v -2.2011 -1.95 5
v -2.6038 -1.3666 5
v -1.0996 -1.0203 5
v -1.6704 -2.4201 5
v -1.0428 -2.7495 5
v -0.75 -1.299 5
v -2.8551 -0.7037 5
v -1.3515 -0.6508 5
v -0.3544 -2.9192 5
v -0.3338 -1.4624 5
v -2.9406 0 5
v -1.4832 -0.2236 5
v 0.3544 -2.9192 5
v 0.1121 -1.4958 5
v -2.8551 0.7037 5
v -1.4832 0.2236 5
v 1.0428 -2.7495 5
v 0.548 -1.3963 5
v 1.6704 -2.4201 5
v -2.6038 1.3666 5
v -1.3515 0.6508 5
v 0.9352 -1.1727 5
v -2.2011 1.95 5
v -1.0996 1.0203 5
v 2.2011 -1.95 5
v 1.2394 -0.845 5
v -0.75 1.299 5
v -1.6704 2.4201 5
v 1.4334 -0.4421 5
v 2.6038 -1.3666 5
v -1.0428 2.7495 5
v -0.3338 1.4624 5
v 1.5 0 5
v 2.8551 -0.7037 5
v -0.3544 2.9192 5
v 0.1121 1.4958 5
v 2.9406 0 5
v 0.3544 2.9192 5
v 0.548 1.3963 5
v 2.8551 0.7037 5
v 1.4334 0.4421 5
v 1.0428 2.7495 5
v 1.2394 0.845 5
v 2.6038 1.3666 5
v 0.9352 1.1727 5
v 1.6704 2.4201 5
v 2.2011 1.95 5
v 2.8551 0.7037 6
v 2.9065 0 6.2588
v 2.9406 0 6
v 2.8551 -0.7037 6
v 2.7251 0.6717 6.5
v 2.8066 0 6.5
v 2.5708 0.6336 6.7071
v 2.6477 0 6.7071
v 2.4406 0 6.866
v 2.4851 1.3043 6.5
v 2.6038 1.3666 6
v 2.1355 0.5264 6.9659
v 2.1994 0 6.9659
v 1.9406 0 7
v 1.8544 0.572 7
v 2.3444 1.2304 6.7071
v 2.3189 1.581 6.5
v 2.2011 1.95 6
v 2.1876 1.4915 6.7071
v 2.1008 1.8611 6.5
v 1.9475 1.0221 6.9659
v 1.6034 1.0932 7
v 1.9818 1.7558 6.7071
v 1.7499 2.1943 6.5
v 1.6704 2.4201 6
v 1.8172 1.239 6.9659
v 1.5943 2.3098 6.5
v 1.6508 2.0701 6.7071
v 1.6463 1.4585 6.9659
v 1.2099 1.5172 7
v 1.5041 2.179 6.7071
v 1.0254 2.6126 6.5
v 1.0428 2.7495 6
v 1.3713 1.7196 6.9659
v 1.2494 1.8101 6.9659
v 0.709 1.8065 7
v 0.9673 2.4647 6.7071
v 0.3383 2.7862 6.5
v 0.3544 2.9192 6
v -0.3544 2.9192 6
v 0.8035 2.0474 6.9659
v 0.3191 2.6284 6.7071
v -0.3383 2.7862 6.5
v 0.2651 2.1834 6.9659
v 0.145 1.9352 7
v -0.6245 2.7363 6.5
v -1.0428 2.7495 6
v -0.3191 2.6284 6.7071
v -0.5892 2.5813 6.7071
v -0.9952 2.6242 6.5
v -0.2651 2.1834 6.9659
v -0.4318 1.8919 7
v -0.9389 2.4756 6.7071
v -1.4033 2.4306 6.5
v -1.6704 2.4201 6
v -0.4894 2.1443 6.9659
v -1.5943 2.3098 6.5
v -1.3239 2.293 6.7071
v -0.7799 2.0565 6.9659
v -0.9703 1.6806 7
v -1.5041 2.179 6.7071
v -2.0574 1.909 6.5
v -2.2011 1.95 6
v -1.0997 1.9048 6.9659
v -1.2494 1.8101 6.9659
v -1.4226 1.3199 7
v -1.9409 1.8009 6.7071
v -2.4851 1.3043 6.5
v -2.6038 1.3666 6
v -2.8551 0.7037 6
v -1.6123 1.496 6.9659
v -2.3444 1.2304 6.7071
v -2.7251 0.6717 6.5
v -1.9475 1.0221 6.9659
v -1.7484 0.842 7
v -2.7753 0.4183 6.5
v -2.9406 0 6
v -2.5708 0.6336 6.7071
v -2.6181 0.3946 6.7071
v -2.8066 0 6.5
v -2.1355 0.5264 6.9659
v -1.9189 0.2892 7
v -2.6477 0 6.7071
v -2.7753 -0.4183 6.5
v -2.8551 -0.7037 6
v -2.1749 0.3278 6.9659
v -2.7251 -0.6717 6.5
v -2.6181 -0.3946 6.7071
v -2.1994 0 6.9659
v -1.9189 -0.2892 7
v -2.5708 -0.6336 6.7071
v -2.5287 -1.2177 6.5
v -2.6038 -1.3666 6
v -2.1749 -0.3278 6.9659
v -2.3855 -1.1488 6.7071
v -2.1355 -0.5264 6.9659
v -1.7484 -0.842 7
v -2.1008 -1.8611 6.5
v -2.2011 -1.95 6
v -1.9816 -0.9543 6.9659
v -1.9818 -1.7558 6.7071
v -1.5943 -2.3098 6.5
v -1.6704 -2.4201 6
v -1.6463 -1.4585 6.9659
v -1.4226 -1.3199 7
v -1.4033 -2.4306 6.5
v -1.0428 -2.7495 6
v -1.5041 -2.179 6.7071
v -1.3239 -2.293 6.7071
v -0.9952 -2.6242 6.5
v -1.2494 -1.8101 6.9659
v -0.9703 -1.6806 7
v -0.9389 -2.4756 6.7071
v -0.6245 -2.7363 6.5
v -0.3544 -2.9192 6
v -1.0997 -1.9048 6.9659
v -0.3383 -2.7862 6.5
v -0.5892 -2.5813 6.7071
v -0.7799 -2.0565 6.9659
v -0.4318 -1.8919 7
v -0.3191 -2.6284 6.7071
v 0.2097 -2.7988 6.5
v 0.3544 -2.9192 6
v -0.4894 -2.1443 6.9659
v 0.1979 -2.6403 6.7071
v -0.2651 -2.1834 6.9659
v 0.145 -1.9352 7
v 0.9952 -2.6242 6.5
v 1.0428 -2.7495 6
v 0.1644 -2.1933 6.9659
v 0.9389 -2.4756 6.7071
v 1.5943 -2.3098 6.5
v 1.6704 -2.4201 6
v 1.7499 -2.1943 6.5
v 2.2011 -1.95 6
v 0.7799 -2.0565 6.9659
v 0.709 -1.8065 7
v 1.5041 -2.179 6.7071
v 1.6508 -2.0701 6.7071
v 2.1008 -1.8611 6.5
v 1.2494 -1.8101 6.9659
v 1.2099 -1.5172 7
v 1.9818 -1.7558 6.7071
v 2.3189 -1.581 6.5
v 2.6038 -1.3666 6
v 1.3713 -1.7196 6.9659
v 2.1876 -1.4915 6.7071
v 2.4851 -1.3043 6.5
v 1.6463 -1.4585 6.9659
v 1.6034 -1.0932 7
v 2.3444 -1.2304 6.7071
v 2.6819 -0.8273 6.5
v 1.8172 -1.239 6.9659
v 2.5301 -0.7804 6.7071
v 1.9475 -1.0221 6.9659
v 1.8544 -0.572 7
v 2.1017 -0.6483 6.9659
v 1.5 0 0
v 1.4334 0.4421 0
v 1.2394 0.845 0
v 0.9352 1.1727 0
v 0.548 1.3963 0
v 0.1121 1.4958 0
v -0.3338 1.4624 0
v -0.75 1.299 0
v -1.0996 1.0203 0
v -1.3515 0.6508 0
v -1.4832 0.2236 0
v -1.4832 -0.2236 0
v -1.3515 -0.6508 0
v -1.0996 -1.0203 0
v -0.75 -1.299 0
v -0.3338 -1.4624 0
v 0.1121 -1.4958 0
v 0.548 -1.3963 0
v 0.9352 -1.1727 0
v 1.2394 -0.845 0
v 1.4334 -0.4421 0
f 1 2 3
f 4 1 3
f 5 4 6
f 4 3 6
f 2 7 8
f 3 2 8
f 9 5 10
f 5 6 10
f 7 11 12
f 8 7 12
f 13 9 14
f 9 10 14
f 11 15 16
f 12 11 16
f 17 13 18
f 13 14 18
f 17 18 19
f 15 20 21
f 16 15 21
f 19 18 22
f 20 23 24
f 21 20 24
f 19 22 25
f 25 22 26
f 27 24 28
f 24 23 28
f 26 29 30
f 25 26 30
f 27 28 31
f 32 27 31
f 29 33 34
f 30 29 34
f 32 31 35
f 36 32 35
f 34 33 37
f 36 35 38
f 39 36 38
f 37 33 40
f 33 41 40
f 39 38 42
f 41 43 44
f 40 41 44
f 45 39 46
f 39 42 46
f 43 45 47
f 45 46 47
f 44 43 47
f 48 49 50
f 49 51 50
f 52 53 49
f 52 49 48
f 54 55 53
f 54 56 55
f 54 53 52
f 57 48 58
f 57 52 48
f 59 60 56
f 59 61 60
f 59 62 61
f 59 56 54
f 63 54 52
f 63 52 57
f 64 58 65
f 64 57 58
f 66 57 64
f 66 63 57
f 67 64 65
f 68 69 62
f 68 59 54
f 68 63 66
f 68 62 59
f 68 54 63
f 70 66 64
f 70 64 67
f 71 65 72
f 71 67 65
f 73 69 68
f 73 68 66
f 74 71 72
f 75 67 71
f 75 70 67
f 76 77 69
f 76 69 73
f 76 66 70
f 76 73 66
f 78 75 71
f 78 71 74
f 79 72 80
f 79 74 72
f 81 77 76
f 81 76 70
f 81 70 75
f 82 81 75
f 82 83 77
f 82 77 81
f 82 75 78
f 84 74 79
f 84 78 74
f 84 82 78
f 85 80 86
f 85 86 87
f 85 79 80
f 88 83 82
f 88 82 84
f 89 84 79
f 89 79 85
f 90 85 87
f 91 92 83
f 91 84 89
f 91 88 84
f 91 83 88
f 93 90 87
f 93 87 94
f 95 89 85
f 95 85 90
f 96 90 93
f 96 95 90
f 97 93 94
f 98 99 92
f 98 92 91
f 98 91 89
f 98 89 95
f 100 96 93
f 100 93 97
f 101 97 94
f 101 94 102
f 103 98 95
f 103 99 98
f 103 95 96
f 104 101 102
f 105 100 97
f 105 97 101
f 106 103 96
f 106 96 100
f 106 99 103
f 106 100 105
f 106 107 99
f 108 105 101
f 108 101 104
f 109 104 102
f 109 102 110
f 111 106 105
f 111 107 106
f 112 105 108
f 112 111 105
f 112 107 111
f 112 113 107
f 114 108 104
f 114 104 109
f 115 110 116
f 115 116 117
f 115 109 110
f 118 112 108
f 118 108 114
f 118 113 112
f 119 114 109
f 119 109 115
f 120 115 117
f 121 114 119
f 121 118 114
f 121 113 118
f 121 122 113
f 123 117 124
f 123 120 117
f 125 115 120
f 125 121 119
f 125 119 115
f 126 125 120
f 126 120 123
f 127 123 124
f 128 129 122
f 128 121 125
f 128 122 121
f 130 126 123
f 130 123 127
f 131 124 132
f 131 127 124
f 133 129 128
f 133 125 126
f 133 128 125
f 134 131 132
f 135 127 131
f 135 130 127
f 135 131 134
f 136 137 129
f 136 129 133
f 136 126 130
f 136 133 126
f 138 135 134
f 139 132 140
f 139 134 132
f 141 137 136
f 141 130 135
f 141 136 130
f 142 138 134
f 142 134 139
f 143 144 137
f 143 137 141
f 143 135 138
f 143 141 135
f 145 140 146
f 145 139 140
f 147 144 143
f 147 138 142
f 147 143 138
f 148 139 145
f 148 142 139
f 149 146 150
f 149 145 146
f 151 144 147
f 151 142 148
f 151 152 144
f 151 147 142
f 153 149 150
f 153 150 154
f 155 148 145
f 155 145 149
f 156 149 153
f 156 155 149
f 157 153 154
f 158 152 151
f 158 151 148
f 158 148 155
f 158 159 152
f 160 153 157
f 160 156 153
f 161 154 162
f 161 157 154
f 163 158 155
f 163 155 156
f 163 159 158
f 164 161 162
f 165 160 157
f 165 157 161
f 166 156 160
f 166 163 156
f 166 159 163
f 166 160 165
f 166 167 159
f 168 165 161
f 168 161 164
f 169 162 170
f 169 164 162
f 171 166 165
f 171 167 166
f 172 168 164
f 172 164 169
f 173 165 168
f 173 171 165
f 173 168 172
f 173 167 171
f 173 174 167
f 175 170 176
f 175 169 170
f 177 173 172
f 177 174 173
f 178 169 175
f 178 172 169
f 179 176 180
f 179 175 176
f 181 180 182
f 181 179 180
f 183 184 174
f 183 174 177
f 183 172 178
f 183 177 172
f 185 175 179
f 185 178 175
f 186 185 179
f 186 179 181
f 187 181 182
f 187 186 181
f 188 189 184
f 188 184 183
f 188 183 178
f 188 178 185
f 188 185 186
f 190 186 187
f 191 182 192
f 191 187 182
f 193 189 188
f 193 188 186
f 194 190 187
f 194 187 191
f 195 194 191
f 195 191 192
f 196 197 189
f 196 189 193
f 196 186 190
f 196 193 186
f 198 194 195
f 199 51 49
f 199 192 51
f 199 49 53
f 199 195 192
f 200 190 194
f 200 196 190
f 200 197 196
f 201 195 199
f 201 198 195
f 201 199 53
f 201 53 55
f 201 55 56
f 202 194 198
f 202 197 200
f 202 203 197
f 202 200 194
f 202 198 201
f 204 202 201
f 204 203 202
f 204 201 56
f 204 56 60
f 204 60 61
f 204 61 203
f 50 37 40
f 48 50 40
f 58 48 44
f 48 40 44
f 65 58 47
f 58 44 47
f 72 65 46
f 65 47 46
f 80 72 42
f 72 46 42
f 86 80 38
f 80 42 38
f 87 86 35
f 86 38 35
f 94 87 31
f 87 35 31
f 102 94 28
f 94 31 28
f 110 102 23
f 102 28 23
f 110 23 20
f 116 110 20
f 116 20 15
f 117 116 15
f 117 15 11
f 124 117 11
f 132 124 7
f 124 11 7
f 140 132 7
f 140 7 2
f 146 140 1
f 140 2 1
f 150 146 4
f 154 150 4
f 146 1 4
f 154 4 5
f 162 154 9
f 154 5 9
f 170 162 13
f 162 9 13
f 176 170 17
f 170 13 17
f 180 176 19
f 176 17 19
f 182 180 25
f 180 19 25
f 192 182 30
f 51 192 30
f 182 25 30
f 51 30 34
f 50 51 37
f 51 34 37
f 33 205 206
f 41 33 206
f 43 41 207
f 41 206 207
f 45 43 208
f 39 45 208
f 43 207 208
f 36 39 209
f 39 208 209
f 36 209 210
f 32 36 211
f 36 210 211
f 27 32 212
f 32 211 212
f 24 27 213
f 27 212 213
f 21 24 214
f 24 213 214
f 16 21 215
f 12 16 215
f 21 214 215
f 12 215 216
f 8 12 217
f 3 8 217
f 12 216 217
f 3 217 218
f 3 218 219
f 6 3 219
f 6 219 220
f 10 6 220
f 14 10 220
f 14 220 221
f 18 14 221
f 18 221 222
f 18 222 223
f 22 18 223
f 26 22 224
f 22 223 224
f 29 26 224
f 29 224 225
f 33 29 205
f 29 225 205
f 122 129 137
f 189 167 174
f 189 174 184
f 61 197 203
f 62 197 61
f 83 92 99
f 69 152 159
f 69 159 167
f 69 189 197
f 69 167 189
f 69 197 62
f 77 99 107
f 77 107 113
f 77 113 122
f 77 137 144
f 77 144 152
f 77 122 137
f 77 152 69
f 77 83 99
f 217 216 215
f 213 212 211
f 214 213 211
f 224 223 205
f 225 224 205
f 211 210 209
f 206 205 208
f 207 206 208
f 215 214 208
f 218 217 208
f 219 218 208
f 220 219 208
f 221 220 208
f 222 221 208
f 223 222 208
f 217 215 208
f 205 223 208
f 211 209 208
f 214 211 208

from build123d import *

# Parameters (mm, degrees)
SKETCH1_R           = 1.5
BOSS_EXTRUDE1_DEPTH = 5
SKETCH2_R           = 2.940597014
BOSS_EXTRUDE2_DEPTH = 2
FILLET1_R           = 1


with BuildPart() as part:
    # Sketch1 → Boss-Extrude1 (new body)
    with BuildSketch(Plane.XY):
        Circle(SKETCH1_R)
    extrude(amount=BOSS_EXTRUDE1_DEPTH)

    # Sketch2 → Boss-Extrude2 (add)
    with BuildSketch(Plane.XY.offset(5)):
        Circle(SKETCH2_R)
    extrude(amount=BOSS_EXTRUDE2_DEPTH)

    # Fillet1
    fillet1_edges = [part.edges().sort_by_distance(p)[0] for p in [
        (-2.940597014, 0, 7),
    ]]
    fillet(fillet1_edges, radius=FILLET1_R)


solid = part.part
